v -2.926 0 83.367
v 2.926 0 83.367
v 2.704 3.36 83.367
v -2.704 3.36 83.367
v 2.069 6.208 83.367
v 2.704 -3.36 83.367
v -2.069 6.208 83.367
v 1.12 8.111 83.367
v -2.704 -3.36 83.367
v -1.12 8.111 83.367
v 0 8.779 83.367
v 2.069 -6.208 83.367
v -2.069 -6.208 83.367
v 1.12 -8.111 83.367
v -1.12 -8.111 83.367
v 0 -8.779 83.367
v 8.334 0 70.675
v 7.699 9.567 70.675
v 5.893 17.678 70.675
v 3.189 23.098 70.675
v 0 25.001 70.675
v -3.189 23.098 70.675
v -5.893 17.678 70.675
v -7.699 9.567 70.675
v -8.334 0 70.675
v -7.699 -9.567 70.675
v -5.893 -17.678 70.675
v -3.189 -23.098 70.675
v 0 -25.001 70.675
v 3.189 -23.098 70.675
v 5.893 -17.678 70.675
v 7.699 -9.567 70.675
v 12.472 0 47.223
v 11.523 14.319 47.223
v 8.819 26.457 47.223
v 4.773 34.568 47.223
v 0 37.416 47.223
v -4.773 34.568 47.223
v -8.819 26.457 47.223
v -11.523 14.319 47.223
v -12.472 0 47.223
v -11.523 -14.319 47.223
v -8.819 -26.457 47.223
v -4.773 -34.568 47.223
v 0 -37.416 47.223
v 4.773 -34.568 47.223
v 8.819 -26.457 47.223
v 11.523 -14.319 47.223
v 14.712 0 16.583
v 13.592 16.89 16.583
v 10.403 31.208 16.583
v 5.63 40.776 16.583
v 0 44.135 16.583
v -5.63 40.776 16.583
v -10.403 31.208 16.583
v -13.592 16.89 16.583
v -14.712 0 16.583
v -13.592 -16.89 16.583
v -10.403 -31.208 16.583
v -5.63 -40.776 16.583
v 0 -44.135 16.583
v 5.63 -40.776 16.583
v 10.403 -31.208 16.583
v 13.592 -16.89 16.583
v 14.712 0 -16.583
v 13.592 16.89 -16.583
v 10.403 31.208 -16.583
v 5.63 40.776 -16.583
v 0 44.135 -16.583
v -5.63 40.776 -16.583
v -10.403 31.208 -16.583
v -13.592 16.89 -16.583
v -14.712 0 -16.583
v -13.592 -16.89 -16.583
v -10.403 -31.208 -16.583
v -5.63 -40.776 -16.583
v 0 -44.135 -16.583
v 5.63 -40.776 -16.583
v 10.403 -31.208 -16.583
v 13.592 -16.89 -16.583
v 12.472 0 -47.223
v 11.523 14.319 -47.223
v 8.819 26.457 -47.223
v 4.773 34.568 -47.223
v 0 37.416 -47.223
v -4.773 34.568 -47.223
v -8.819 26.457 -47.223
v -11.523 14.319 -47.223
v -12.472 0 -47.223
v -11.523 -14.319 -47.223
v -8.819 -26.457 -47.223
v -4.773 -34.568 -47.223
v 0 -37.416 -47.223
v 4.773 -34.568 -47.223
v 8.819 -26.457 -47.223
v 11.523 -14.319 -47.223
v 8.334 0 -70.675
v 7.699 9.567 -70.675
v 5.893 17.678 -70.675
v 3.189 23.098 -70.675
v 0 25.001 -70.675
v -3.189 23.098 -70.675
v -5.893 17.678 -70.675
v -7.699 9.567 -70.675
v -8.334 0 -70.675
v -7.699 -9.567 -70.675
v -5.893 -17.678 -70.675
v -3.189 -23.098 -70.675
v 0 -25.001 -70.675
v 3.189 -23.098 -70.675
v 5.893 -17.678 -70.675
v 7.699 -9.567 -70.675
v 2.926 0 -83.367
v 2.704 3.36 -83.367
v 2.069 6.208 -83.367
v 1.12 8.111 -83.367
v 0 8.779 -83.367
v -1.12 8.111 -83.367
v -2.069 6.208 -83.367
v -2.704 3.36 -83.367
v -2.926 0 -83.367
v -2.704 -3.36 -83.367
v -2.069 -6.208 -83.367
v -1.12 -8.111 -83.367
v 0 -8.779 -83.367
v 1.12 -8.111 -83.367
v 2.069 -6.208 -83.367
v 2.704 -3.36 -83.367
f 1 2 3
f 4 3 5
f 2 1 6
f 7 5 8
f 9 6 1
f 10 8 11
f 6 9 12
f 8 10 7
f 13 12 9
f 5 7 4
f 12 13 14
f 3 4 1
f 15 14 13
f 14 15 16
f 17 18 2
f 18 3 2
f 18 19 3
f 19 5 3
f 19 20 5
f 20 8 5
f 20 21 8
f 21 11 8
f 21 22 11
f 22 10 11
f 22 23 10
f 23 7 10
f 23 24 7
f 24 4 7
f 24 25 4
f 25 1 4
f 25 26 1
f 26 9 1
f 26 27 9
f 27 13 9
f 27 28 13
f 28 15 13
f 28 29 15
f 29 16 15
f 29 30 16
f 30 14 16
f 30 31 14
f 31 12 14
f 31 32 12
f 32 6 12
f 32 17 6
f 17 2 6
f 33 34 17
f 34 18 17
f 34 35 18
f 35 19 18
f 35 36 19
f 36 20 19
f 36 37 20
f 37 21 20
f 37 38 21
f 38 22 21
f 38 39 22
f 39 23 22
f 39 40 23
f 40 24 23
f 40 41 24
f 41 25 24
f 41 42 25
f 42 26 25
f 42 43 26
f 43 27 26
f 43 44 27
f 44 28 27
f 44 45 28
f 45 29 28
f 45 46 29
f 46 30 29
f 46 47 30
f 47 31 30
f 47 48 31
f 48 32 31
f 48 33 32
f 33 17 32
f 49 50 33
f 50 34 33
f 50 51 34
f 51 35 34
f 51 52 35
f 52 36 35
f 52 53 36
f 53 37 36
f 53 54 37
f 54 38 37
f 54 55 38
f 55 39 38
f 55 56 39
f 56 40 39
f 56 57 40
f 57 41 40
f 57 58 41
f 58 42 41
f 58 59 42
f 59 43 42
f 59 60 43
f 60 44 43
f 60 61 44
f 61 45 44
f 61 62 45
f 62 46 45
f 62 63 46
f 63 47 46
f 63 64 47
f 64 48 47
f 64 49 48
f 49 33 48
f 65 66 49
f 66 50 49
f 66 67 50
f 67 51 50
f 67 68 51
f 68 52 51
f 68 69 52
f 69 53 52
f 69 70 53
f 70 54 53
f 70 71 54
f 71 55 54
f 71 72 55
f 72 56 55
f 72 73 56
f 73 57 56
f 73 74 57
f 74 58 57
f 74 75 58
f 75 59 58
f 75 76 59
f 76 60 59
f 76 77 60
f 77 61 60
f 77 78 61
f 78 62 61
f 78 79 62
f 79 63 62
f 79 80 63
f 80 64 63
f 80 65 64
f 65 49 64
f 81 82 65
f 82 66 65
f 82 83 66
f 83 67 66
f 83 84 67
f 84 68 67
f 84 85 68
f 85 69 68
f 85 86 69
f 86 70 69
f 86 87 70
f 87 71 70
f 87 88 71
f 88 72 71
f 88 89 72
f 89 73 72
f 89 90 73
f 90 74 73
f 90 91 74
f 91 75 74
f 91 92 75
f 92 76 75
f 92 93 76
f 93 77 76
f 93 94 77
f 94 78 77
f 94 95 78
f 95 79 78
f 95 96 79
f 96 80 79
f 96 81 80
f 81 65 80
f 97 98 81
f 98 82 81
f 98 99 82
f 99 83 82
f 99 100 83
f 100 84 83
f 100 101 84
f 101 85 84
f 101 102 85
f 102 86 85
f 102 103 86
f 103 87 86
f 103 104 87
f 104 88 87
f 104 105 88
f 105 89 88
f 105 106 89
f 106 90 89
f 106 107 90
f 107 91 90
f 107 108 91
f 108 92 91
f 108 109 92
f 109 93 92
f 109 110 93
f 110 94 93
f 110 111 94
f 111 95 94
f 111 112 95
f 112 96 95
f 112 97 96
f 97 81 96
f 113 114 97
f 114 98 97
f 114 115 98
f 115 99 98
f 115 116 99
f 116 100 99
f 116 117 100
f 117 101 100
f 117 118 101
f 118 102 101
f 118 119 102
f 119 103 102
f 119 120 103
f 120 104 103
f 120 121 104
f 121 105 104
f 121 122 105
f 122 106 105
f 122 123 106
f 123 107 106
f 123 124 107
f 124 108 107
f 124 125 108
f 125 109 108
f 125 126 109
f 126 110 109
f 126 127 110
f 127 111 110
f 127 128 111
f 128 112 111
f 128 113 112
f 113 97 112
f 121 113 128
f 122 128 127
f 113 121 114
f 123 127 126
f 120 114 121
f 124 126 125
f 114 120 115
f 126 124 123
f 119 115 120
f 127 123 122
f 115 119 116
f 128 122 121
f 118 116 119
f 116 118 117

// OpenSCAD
// Generated by SolidPython 1.0.1 on 2020-07-29 00:46:45


scale(v = [3, 9, 17]) {
	sphere(r = 5);
}
/***********************************************
*********      SolidPython code:      **********
************************************************
 
# import packages: SolidPython
from solid import *
from solid.utils import *
from itertools import chain, combinations, permutations


class Resize:

    def __init__(self, scad_file):
        self.scad_file = scad_file
        #self.scad_file = import_scad(scad_file)
        # cone/cylinder param:
        self.r1 = 0
        self.r2 = 0
        self.h = 0
        # rectangular prism param:
        self.w = 0
        self.l = 0
        # ellipse param:
        self.r = 0

    # import OpenScad code (file name corresponds to shape)


    # classify shape + parameters
    def assign(self, param1, param2, param3):
        if self.scad_file == 'cone.scad':
            self.r1 = param1
            self.r2 = param2
            self.h = param3
        elif self.scad_file == 'cylinder.scad':
            self.r1 = param1
            self.r2 = param2
            self.h = param3
        elif self.scad_file == 'rectangularPrism.scad':
            self.h = param1
            self.l = param2
            self.w = param3
        else:
            self.r = param1
            self.h = param2

    # resize parameters
    def iterate(self):
        x = range(3, 20, 2)
        i = 1
        if self.scad_file == 'cone.scad':
            tempList = list(permutations(x, 2))
            for temp in tempList:
                param1 = temp[0]
                param2 = temp[1]
                filepath = 'produced_scad_files/' + 'cone' + str(param1) + '_' + str(param2) + '_' + '.scad'
                scad_render_to_file(cylinder(h=param1, r1=param2, r2=0), filepath)

        elif self.scad_file == 'cylinder.scad':
            tempList = list(permutations(x, 3))
            for temp in tempList:
                param1 = temp[0]
                param2 = temp[1]
                filepath = 'produced_scad_files/' + 'cylinder' + str(param1) + '_' + str(param2) + '_' + '.scad'
                scad_render_to_file(cylinder(h=param1, r1=param2, r2=param2), filepath)

        elif self.scad_file == 'rectangularPrism.scad':
            tempList = list(permutations(x, 3))
            for temp in tempList:
                param1 = temp[0]
                param2 = temp[1]
                param3 = temp[2]
                filepath = 'produced_scad_files/' + 'rectangularPrism' + str(param1) + '_' + str(param2) + '_' + str(
                    param3) + '.scad'
                scad_render_to_file(cube(size=(param1, param2, param3)), filepath)

        elif self.scad_file == 'ellipse.scad':
            tempList = list(permutations(x, 4))
            for temp in tempList:
                param1 = temp[0]
                param2 = temp[1]
                param3 = temp[2]
                param4 = temp[3]
                filepath = 'produced_scad_files/' + 'ellipse' + str(param1) + '_' + str(param2) + '_' + str(param3) + '_' + str(param4) + '.scad'
                scad_render_to_file(scale([param1, param2, param3])(sphere(r=param4)), filepath)

    def render_to_scadfile(self):
        scad_render_to_file(scad, 'example.scad') 
 
************************************************/
